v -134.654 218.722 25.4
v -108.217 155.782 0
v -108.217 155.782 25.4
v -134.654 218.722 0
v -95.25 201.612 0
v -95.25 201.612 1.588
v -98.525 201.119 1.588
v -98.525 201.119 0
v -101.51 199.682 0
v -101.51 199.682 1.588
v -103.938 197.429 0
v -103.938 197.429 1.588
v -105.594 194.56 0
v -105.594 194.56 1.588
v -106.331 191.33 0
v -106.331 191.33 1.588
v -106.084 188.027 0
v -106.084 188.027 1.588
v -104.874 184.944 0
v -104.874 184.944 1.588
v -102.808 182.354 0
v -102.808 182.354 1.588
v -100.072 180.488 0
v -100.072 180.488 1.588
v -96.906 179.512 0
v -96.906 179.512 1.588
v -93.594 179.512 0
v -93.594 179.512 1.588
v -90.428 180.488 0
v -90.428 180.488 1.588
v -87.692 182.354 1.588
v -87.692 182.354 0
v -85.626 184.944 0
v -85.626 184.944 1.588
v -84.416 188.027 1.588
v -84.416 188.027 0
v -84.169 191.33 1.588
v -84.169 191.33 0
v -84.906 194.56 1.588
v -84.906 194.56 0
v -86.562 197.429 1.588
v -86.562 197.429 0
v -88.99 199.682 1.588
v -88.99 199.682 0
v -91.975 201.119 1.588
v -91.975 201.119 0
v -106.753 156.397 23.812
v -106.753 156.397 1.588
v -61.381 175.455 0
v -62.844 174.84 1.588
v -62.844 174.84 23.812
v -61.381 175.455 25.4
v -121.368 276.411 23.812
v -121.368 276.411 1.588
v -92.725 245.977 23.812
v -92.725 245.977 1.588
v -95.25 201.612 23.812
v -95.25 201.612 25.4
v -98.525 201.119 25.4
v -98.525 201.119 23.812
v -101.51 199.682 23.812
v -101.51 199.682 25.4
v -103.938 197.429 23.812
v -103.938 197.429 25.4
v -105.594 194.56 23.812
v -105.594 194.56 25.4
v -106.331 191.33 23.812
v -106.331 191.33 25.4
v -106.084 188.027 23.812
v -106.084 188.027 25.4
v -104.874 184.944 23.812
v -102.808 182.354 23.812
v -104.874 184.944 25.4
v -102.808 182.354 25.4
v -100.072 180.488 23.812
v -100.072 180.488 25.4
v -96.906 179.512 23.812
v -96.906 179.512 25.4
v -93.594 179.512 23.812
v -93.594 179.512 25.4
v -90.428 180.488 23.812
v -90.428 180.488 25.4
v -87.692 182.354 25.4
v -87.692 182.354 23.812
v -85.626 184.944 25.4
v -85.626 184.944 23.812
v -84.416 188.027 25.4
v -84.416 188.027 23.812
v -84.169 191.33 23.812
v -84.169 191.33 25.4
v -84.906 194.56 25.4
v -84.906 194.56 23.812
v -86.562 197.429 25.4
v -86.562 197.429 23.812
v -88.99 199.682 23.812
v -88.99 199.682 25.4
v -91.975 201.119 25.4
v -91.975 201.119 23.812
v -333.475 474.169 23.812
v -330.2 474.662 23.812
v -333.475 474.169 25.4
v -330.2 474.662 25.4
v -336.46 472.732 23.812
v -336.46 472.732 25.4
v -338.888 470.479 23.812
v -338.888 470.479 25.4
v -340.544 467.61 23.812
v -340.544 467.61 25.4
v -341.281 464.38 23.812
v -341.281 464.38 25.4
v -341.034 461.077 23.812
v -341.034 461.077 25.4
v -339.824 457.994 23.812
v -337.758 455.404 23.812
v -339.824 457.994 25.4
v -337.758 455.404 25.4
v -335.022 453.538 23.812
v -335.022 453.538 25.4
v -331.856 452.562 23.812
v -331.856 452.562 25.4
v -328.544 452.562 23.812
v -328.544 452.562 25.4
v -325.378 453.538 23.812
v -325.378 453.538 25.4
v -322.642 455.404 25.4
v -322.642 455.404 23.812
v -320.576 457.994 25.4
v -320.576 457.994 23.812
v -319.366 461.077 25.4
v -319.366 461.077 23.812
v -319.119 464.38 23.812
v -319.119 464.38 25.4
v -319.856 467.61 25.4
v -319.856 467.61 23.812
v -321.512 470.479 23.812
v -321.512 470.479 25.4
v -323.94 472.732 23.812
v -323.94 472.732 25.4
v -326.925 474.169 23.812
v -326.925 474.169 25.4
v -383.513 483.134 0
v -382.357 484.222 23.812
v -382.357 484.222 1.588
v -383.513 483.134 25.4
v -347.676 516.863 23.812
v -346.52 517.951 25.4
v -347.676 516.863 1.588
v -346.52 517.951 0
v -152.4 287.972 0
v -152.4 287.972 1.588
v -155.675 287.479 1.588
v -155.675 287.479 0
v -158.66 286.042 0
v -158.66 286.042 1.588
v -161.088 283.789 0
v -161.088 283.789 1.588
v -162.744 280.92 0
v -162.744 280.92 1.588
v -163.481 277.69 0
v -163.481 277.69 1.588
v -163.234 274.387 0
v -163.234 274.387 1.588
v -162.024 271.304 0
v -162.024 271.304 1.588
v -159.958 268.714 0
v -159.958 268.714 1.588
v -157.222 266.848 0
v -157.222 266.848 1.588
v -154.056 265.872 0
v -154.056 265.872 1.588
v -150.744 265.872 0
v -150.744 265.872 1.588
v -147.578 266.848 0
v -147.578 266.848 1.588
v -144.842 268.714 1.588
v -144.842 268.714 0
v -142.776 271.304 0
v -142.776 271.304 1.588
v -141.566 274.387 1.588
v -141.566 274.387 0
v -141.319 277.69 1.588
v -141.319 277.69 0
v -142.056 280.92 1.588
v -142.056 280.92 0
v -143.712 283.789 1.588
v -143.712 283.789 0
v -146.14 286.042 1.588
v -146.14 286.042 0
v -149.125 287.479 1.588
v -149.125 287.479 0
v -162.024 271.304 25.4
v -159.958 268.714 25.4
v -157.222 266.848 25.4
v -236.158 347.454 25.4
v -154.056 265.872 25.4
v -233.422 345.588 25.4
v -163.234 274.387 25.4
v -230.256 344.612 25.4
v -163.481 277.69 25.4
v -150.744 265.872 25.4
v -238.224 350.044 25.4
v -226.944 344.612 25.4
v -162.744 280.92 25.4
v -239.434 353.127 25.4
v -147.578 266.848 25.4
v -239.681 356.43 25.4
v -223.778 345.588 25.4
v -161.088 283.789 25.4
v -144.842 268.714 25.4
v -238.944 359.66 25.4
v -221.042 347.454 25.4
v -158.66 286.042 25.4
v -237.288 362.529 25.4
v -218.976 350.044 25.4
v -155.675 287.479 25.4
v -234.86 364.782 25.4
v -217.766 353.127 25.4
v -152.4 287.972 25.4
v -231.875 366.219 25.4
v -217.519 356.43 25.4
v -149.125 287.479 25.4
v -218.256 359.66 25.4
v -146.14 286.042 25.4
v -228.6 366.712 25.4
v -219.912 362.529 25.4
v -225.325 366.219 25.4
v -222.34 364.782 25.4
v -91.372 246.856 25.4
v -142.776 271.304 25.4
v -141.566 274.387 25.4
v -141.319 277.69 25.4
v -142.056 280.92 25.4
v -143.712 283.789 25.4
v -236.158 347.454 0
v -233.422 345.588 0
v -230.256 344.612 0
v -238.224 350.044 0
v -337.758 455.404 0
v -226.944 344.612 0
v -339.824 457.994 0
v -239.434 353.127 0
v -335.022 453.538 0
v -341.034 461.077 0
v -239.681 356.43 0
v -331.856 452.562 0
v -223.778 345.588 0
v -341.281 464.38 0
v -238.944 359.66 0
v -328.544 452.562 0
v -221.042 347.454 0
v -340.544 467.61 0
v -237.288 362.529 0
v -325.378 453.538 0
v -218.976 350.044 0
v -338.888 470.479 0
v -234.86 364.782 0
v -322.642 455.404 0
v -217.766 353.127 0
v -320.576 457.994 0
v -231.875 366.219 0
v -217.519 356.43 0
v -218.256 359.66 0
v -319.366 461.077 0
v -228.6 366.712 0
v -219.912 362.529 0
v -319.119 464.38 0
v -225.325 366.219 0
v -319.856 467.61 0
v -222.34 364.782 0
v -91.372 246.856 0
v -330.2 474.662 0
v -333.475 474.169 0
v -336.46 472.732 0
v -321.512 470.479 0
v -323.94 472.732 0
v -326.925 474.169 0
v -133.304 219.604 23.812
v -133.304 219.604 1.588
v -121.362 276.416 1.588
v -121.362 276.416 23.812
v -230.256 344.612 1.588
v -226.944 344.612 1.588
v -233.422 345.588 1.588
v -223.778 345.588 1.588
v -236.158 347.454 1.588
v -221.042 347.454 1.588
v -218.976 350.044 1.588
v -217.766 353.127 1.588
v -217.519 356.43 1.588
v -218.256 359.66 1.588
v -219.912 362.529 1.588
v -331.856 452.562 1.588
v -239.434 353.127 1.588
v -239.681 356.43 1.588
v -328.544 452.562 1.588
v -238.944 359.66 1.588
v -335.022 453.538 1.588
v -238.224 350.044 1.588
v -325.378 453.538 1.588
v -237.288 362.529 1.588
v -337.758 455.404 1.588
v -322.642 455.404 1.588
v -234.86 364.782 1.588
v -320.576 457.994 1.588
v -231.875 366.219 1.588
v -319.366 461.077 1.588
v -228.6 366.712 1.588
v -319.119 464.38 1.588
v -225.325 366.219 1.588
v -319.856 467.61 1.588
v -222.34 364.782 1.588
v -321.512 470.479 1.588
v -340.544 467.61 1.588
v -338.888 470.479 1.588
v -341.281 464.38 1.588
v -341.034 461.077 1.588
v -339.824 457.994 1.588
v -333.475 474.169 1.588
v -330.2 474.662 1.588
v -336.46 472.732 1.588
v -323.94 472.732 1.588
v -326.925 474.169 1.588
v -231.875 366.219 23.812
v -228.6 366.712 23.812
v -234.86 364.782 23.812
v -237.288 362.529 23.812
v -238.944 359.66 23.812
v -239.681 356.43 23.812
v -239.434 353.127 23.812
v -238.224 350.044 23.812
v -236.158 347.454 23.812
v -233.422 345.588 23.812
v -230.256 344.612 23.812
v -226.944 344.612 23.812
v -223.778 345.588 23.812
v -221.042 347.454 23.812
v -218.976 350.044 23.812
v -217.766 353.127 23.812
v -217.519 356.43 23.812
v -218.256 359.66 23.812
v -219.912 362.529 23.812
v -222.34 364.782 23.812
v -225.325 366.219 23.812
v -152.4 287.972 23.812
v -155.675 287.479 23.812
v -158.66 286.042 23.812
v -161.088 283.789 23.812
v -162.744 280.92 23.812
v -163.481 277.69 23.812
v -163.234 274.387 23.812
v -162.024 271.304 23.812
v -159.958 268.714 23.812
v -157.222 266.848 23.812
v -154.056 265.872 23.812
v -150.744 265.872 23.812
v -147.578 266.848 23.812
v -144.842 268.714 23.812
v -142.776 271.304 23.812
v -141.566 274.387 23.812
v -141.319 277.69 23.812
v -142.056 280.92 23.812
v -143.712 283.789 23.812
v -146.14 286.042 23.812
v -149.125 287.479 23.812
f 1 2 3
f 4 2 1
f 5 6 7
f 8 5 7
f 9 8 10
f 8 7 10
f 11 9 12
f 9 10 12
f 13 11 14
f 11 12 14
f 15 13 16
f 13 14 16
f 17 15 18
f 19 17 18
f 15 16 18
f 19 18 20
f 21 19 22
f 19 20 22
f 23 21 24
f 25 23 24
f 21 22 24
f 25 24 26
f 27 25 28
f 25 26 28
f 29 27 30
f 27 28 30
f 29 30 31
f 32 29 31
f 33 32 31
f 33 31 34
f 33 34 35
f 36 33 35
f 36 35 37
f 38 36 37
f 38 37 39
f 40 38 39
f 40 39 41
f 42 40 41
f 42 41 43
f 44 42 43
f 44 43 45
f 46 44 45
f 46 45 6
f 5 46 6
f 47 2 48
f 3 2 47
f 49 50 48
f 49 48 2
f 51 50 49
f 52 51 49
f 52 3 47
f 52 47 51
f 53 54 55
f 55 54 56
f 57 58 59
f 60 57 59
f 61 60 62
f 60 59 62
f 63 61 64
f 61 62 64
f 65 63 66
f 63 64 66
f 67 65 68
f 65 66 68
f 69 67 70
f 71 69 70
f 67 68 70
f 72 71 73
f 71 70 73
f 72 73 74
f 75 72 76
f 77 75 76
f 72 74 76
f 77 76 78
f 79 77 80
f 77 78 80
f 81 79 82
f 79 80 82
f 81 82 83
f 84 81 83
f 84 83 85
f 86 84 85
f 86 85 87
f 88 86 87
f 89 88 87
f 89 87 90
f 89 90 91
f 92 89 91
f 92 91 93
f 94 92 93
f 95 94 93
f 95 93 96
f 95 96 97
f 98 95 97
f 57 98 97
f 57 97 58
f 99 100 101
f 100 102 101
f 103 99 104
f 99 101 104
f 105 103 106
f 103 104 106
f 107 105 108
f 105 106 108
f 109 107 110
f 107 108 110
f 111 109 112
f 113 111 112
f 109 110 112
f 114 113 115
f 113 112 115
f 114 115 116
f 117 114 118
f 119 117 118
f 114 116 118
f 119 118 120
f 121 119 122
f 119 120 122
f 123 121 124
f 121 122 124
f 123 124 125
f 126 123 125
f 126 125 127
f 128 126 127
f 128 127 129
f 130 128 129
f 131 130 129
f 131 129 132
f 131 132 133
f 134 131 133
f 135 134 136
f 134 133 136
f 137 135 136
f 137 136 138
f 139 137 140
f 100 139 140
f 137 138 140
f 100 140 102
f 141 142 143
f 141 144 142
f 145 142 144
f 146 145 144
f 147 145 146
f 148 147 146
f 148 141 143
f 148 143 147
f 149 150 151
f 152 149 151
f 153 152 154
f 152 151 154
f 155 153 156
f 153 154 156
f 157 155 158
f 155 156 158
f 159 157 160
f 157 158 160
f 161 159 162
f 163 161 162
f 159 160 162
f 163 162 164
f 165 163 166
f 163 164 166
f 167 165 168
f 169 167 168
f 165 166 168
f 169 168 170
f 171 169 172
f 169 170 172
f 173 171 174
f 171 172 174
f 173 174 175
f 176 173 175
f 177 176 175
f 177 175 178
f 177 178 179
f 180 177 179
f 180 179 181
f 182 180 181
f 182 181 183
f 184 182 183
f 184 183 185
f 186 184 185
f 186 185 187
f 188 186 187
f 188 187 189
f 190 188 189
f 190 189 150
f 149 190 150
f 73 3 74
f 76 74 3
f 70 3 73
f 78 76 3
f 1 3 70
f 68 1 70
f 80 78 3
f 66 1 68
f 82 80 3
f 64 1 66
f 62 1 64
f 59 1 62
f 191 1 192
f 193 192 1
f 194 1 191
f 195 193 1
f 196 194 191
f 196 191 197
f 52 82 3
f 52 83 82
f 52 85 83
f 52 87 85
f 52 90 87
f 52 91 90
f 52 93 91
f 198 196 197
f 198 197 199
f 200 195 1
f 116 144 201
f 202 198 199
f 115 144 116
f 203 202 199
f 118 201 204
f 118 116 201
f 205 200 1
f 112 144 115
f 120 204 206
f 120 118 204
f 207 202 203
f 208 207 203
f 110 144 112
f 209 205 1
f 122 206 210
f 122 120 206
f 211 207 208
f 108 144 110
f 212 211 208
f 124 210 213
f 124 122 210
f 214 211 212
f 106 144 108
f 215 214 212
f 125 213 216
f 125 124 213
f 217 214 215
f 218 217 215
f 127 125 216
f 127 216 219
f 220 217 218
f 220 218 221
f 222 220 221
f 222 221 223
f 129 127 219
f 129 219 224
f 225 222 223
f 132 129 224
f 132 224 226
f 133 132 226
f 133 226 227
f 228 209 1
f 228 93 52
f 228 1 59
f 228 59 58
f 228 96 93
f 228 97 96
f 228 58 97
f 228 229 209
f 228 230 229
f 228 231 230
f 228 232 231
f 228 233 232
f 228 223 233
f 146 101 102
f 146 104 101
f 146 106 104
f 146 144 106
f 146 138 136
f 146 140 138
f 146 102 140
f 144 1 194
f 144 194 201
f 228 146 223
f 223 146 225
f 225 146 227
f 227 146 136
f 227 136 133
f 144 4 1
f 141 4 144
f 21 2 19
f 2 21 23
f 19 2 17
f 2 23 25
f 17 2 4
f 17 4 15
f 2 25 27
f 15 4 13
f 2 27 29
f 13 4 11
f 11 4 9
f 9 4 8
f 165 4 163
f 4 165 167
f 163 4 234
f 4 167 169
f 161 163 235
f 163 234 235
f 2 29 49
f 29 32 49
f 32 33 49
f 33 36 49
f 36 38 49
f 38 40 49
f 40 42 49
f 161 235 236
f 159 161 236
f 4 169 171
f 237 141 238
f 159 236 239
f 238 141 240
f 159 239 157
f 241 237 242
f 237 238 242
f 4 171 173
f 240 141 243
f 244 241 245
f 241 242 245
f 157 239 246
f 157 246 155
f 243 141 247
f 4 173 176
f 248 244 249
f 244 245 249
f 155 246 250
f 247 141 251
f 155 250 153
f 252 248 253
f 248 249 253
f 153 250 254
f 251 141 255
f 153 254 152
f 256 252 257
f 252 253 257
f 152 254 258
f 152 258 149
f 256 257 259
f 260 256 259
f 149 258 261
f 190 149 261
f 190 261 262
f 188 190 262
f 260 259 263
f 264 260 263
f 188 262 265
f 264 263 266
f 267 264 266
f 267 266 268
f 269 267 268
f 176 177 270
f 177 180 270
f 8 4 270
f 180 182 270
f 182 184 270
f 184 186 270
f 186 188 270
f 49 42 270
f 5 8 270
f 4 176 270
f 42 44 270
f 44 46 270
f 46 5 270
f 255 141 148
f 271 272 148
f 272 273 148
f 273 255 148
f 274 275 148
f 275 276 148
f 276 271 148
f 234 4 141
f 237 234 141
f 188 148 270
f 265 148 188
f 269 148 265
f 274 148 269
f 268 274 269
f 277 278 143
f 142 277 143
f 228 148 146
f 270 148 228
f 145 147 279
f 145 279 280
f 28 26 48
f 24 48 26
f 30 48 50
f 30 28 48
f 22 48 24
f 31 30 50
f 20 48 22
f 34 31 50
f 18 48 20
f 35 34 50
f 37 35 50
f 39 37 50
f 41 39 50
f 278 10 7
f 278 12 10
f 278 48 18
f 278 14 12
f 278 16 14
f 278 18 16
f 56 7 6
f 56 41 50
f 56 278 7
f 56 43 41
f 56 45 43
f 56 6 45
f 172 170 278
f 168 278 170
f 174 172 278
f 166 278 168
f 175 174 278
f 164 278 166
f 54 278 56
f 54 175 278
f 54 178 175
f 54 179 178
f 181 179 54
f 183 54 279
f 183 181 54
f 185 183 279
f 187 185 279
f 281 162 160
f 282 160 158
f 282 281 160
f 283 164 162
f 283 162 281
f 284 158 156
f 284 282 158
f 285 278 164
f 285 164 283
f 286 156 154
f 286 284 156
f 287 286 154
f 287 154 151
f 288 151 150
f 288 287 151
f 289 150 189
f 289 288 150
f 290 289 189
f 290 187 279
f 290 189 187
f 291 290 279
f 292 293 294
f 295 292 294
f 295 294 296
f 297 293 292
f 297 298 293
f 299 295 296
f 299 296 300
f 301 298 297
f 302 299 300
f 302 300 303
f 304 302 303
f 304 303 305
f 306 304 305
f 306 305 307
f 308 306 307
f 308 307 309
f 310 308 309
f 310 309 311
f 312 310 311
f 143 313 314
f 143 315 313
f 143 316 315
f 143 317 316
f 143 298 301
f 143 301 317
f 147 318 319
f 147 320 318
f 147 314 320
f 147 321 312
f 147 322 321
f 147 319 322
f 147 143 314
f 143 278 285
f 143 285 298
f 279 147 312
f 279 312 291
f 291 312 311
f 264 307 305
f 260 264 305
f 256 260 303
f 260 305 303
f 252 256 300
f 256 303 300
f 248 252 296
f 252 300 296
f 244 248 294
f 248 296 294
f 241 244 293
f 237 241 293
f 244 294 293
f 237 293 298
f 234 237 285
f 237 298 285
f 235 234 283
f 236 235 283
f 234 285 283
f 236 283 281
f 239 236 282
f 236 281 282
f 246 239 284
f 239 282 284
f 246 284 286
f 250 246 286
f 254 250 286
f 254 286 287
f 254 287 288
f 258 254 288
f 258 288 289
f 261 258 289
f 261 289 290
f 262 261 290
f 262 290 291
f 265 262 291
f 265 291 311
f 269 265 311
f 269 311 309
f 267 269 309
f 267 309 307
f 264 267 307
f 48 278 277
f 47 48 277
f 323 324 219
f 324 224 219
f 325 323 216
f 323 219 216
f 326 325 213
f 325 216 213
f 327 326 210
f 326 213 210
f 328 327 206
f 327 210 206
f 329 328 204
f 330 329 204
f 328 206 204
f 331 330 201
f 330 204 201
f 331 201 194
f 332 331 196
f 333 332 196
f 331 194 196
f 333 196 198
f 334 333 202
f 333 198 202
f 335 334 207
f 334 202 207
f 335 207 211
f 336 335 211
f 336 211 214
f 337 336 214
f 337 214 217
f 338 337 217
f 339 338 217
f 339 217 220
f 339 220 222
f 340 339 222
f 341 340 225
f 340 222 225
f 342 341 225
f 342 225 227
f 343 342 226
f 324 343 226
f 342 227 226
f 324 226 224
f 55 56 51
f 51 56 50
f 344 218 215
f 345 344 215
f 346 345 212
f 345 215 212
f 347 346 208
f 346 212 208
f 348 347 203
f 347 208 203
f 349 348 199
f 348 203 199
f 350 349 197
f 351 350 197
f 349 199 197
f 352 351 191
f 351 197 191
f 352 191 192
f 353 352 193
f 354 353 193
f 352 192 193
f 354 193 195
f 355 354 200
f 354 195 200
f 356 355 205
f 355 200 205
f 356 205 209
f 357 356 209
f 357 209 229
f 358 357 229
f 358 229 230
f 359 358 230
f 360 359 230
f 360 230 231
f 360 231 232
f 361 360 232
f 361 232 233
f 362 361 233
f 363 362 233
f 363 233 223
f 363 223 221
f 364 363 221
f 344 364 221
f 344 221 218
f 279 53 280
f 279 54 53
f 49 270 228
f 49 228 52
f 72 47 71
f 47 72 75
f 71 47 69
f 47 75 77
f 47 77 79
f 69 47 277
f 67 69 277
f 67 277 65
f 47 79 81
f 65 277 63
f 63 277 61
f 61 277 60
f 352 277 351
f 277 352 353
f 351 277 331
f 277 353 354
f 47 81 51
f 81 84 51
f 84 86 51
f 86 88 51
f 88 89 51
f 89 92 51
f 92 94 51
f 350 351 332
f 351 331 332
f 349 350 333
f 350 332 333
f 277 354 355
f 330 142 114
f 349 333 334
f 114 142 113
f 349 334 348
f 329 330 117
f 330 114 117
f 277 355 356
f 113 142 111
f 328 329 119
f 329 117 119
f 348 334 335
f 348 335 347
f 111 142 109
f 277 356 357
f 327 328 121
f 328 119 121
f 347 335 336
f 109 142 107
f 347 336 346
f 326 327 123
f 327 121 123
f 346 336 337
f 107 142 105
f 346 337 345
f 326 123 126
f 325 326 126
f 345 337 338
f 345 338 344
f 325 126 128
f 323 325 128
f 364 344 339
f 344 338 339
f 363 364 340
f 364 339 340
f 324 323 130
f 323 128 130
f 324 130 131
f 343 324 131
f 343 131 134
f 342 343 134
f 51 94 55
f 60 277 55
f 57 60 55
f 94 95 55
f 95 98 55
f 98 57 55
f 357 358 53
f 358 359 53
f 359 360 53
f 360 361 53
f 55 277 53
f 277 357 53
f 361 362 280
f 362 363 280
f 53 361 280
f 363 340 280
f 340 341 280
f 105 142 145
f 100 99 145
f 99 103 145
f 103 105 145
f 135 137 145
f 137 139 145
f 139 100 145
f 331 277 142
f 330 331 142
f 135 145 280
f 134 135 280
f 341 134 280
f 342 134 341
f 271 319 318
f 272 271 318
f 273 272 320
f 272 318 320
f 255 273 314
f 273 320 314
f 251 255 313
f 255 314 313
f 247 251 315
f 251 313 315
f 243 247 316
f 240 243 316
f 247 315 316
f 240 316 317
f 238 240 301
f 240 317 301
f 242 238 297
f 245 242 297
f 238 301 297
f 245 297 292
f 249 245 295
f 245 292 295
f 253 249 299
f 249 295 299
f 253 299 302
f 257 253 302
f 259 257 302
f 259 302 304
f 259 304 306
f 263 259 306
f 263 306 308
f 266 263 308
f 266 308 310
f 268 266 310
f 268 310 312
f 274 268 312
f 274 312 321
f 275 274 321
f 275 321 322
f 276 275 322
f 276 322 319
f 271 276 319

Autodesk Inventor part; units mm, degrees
ref_plane "YZ Plane" through (0, 0, 0) normal (1, 0, 0) x (0, 1, 0)
ref_plane "XZ Plane" through (0, 0, 0) normal (0, 1, 0) x (-1, 0, 0)
ref_plane "XY Plane" through (0, 0, 0) normal (0, 0, 1) x (1, 0, 0)
sketch "Sketch1" plane through (0, 0, 0) normal (0, 0, 1) x (1, 0, 0)
  line L0 (0, 0) -> (-254, 0)
  line L1 (-254, 406.4) -> (0, 406.4)
  line L2 (0, 406.4) -> (0, 0)
  line L3 (-254, 0) -> (-254, 155.9052)
  line L4 (-285.75, 187.6552) -> (-355.6, 187.6552)
  circle A0 centre (-95.25, 190.5) radius 38.1
  arc A1 (-254, 155.9052) -> (-285.75, 187.6552) centre (-285.75, 155.9052) ccw
  circle A2 centre (-330.2, 463.55) radius 19.05
  line L5 (-515.6961, 0) -> (516.0768, 0) projected
  line L6 (-368.3, 304.8) -> (-355.6, 187.6552)
  circle A3 centre (-228.6, 355.6) radius 19.05
  circle A4 centre (279.7806, 579.9282) radius 88.9
  circle A5 centre (-152.4, 276.86) radius 19.05
  line L7 (-336.55, 187.6552) -> (-368.3, 304.8)
  point P0 (-254, 187.6552)
  dimension "d0" = 406.4
  dimension "d4" = 158.75
  dimension "d5" = 190.5
  dimension "d6" = 76.2
  dimension "d13" = 31.75
  dimension "d14" = 463.55
  dimension "d20" = 330.2
  dimension "d54" = 101.6
  dimension "d59" = 254
  dimension "d61" = 304.8
  dimension "d62" = 187.6552
  dimension "d63" = 12.7
  dimension "d76" = 38.1
  dimension "d87" = 228.6
  dimension "d88" = 355.6
  dimension "d89" = 38.1
  dimension "d90" = 177.8
  dimension "d91" = 38.1
  dimension "d92" = 276.86
  dimension "d93" = 152.4
  dimension "d94" = 82.55
sketch "Sketch5" plane through (0, 0, 0) normal (0, 0, 1) x (1, 0, 0)
  line L0 (-346.559, 517.9919) -> (-91.3724, 246.8562)
  line L1 (-91.3724, 246.8562) -> (-49.3064, 146.7099)
  line L2 (-49.3064, 146.7099) -> (-96.1423, 127.0367)
  line L3 (-96.1423, 127.0367) -> (-134.6544, 218.7223)
  line L4 (-134.6544, 218.7223) -> (-383.5128, 483.1343)
  line L5 (-383.5128, 483.1343) -> (-346.5202, 517.9508)
  point P0 (0, 0)
  point P1 (-95.25, 190.5)
  point P2 (-152.4, 276.86)
  point P3 (-228.6, 355.6)
  point P4 (-330.2, 463.55)
  dimension "d107" = 50.8
  dimension "d108" = 50.8
  dimension "d109" = 25.4
  dimension "d110" = 25.4
  dimension "d111" = 25.4
  dimension "d113" = 50.8
extrude "Extrusion4" add sketch "Sketch5" along normal blind 25.4
hole "Hole1" at (-95.25, 190.5, 0) at (-152.4, 276.86, 0) at (-228.6, 355.6, 0) at (-330.2, 463.55, 0) direction (0, 0, 1) diameter 22.225 end through all
sketch "Sketch6" plane through (0, 0, 25.4) normal (0, 0, 1) x (1, 0, 0)
  line L0 (-108.2166, 155.7818) -> (-61.3806, 175.455)
  line L1 (-49.3064, 146.7099) -> (-91.3724, 246.8562) projected
  line L2 (-61.3806, 175.455) -> (-49.3064, 146.7099)
  line L3 (-134.6544, 218.7223) -> (-96.1423, 127.0367) projected
  line L4 (-49.3064, 146.7099) -> (-96.1423, 127.0367)
  line L5 (-96.1423, 127.0367) -> (-108.2166, 155.7818)
  circle A0 centre (-95.25, 190.5) radius 11.1125 projected
  point P0 (0, 0)
  dimension "d123" = 26.9875
extrude "Extrusion5" cut sketch "Sketch6" against normal blind 25.4 contours L0 L1 L4 L3
shell "Shell1" thickness 1.5875 removed faces 2 at (-92.6046, 162.3395, 8.4667) at (-358.8511, 506.3453, 8.4667)
sketch "Sketch7" plane through (-383.5128, 483.1343, 25.4) normal (-0.6854, 0.7282, 0) x (0.7282, 0.6854, 0)
  line L0 (49.2125, 1.5875) -> (1.5875, 1.5875) projected
  line L1 (1.5875, 1.5875) -> (1.5875, 23.8125) projected
  line L2 (49.2125, 1.5875) -> (1.5875, 1.5875)
  line L3 (1.5875, 1.5875) -> (1.5875, 23.8125)
  line L4 (1.5875, 23.8125) -> (49.2125, 23.8125)
  line L5 (49.2125, 23.8125) -> (49.2125, 1.5875)
  point P0 (-51.8492, 25.4)
extrude "Extrusion6" cut sketch "Sketch7" against normal blind 330.2
sketch "Sketch8" plane through (-108.2166, 155.7818, 0) normal (0.3873, -0.922, 0) x (0.922, 0.3873, 0)
  line L0 (49.2125, 1.5875) -> (49.2125, 23.8125) projected
  line L1 (49.2125, 1.5875) -> (1.5875, 1.5875)
  line L2 (1.5875, 1.5875) -> (1.5875, 23.8125)
  line L3 (1.5875, 23.8125) -> (49.2125, 23.8125)
  line L4 (49.2125, 23.8125) -> (49.2125, 1.5875)
  point P0 (39.4428, 0)
extrude "Extrusion7" cut sketch "Sketch8" against normal blind 76.2
sketch "Sketch9" plane through (0, 0, 25.4) normal (0, 0, 1) x (1, 0, 0)
  line L0 (-382.3568, 484.2223) -> (-133.3019, 219.6015) projected
  line L1 (-91.3724, 246.8562) -> (-346.5202, 517.9508) projected
  line L2 (-61.3806, 175.455) -> (-91.3724, 246.8562) projected
  line L3 (-91.3724, 246.8562) -> (-61.3806, 175.455)
  line L4 (-134.6544, 218.7223) -> (-108.2166, 155.7818) projected
  line L5 (-61.3806, 175.455) -> (-108.2166, 155.7818)
  line L6 (-108.2166, 155.7818) -> (-134.6544, 218.7223)
  line L7 (-383.5128, 483.1343) -> (-134.6544, 218.7223) projected
  line L8 (-91.3724, 246.8562) -> (-134.6544, 218.7223)
  line L9 (-91.3724, 246.8562) -> (-141.3682, 225.8557)
  line L10 (-91.3724, 246.8562) -> (-130.8608, 209.6907)
  line L11 (-346.5202, 517.9508) -> (-383.5128, 483.1343) projected
  point P0 (0, 0)
sketch "Sketch10" plane through (0, 0, 25.4) normal (0, 0, 1) x (1, 0, 0)
  circle A0 centre (-948.4671, 602.0735) radius 85.2109
  circle A1 centre (-704.3018, 697.4759) radius 79.8897
  point P0 (0, 0)
sketch "Sketch11" plane through (0, 0, 0) normal (0, 0, -1) x (-1, 0, 0)
  line L0 (61.3806, 175.455) -> (91.3724, 246.8562) projected
  line L1 (91.3724, 246.8562) -> (141.3682, 225.8557)
  line L2 (383.5128, 483.1343) -> (134.6544, 218.7223) projected
  line L3 (61.3806, 175.455) -> (108.2166, 155.7818) projected
  line L4 (134.6544, 218.7223) -> (108.2166, 155.7818) projected
  line L5 (91.3724, 246.8562) -> (134.6544, 218.7223)
  line L6 (91.3724, 246.8562) -> (346.5202, 517.9508) projected
  line L7 (91.3724, 246.8562) -> (130.8607, 209.6906)
  point P0 (0, 0)
  dimension "d131" = 10.24
properties part number "RollerIntakePrototype 2.0 3 WHEELS"
